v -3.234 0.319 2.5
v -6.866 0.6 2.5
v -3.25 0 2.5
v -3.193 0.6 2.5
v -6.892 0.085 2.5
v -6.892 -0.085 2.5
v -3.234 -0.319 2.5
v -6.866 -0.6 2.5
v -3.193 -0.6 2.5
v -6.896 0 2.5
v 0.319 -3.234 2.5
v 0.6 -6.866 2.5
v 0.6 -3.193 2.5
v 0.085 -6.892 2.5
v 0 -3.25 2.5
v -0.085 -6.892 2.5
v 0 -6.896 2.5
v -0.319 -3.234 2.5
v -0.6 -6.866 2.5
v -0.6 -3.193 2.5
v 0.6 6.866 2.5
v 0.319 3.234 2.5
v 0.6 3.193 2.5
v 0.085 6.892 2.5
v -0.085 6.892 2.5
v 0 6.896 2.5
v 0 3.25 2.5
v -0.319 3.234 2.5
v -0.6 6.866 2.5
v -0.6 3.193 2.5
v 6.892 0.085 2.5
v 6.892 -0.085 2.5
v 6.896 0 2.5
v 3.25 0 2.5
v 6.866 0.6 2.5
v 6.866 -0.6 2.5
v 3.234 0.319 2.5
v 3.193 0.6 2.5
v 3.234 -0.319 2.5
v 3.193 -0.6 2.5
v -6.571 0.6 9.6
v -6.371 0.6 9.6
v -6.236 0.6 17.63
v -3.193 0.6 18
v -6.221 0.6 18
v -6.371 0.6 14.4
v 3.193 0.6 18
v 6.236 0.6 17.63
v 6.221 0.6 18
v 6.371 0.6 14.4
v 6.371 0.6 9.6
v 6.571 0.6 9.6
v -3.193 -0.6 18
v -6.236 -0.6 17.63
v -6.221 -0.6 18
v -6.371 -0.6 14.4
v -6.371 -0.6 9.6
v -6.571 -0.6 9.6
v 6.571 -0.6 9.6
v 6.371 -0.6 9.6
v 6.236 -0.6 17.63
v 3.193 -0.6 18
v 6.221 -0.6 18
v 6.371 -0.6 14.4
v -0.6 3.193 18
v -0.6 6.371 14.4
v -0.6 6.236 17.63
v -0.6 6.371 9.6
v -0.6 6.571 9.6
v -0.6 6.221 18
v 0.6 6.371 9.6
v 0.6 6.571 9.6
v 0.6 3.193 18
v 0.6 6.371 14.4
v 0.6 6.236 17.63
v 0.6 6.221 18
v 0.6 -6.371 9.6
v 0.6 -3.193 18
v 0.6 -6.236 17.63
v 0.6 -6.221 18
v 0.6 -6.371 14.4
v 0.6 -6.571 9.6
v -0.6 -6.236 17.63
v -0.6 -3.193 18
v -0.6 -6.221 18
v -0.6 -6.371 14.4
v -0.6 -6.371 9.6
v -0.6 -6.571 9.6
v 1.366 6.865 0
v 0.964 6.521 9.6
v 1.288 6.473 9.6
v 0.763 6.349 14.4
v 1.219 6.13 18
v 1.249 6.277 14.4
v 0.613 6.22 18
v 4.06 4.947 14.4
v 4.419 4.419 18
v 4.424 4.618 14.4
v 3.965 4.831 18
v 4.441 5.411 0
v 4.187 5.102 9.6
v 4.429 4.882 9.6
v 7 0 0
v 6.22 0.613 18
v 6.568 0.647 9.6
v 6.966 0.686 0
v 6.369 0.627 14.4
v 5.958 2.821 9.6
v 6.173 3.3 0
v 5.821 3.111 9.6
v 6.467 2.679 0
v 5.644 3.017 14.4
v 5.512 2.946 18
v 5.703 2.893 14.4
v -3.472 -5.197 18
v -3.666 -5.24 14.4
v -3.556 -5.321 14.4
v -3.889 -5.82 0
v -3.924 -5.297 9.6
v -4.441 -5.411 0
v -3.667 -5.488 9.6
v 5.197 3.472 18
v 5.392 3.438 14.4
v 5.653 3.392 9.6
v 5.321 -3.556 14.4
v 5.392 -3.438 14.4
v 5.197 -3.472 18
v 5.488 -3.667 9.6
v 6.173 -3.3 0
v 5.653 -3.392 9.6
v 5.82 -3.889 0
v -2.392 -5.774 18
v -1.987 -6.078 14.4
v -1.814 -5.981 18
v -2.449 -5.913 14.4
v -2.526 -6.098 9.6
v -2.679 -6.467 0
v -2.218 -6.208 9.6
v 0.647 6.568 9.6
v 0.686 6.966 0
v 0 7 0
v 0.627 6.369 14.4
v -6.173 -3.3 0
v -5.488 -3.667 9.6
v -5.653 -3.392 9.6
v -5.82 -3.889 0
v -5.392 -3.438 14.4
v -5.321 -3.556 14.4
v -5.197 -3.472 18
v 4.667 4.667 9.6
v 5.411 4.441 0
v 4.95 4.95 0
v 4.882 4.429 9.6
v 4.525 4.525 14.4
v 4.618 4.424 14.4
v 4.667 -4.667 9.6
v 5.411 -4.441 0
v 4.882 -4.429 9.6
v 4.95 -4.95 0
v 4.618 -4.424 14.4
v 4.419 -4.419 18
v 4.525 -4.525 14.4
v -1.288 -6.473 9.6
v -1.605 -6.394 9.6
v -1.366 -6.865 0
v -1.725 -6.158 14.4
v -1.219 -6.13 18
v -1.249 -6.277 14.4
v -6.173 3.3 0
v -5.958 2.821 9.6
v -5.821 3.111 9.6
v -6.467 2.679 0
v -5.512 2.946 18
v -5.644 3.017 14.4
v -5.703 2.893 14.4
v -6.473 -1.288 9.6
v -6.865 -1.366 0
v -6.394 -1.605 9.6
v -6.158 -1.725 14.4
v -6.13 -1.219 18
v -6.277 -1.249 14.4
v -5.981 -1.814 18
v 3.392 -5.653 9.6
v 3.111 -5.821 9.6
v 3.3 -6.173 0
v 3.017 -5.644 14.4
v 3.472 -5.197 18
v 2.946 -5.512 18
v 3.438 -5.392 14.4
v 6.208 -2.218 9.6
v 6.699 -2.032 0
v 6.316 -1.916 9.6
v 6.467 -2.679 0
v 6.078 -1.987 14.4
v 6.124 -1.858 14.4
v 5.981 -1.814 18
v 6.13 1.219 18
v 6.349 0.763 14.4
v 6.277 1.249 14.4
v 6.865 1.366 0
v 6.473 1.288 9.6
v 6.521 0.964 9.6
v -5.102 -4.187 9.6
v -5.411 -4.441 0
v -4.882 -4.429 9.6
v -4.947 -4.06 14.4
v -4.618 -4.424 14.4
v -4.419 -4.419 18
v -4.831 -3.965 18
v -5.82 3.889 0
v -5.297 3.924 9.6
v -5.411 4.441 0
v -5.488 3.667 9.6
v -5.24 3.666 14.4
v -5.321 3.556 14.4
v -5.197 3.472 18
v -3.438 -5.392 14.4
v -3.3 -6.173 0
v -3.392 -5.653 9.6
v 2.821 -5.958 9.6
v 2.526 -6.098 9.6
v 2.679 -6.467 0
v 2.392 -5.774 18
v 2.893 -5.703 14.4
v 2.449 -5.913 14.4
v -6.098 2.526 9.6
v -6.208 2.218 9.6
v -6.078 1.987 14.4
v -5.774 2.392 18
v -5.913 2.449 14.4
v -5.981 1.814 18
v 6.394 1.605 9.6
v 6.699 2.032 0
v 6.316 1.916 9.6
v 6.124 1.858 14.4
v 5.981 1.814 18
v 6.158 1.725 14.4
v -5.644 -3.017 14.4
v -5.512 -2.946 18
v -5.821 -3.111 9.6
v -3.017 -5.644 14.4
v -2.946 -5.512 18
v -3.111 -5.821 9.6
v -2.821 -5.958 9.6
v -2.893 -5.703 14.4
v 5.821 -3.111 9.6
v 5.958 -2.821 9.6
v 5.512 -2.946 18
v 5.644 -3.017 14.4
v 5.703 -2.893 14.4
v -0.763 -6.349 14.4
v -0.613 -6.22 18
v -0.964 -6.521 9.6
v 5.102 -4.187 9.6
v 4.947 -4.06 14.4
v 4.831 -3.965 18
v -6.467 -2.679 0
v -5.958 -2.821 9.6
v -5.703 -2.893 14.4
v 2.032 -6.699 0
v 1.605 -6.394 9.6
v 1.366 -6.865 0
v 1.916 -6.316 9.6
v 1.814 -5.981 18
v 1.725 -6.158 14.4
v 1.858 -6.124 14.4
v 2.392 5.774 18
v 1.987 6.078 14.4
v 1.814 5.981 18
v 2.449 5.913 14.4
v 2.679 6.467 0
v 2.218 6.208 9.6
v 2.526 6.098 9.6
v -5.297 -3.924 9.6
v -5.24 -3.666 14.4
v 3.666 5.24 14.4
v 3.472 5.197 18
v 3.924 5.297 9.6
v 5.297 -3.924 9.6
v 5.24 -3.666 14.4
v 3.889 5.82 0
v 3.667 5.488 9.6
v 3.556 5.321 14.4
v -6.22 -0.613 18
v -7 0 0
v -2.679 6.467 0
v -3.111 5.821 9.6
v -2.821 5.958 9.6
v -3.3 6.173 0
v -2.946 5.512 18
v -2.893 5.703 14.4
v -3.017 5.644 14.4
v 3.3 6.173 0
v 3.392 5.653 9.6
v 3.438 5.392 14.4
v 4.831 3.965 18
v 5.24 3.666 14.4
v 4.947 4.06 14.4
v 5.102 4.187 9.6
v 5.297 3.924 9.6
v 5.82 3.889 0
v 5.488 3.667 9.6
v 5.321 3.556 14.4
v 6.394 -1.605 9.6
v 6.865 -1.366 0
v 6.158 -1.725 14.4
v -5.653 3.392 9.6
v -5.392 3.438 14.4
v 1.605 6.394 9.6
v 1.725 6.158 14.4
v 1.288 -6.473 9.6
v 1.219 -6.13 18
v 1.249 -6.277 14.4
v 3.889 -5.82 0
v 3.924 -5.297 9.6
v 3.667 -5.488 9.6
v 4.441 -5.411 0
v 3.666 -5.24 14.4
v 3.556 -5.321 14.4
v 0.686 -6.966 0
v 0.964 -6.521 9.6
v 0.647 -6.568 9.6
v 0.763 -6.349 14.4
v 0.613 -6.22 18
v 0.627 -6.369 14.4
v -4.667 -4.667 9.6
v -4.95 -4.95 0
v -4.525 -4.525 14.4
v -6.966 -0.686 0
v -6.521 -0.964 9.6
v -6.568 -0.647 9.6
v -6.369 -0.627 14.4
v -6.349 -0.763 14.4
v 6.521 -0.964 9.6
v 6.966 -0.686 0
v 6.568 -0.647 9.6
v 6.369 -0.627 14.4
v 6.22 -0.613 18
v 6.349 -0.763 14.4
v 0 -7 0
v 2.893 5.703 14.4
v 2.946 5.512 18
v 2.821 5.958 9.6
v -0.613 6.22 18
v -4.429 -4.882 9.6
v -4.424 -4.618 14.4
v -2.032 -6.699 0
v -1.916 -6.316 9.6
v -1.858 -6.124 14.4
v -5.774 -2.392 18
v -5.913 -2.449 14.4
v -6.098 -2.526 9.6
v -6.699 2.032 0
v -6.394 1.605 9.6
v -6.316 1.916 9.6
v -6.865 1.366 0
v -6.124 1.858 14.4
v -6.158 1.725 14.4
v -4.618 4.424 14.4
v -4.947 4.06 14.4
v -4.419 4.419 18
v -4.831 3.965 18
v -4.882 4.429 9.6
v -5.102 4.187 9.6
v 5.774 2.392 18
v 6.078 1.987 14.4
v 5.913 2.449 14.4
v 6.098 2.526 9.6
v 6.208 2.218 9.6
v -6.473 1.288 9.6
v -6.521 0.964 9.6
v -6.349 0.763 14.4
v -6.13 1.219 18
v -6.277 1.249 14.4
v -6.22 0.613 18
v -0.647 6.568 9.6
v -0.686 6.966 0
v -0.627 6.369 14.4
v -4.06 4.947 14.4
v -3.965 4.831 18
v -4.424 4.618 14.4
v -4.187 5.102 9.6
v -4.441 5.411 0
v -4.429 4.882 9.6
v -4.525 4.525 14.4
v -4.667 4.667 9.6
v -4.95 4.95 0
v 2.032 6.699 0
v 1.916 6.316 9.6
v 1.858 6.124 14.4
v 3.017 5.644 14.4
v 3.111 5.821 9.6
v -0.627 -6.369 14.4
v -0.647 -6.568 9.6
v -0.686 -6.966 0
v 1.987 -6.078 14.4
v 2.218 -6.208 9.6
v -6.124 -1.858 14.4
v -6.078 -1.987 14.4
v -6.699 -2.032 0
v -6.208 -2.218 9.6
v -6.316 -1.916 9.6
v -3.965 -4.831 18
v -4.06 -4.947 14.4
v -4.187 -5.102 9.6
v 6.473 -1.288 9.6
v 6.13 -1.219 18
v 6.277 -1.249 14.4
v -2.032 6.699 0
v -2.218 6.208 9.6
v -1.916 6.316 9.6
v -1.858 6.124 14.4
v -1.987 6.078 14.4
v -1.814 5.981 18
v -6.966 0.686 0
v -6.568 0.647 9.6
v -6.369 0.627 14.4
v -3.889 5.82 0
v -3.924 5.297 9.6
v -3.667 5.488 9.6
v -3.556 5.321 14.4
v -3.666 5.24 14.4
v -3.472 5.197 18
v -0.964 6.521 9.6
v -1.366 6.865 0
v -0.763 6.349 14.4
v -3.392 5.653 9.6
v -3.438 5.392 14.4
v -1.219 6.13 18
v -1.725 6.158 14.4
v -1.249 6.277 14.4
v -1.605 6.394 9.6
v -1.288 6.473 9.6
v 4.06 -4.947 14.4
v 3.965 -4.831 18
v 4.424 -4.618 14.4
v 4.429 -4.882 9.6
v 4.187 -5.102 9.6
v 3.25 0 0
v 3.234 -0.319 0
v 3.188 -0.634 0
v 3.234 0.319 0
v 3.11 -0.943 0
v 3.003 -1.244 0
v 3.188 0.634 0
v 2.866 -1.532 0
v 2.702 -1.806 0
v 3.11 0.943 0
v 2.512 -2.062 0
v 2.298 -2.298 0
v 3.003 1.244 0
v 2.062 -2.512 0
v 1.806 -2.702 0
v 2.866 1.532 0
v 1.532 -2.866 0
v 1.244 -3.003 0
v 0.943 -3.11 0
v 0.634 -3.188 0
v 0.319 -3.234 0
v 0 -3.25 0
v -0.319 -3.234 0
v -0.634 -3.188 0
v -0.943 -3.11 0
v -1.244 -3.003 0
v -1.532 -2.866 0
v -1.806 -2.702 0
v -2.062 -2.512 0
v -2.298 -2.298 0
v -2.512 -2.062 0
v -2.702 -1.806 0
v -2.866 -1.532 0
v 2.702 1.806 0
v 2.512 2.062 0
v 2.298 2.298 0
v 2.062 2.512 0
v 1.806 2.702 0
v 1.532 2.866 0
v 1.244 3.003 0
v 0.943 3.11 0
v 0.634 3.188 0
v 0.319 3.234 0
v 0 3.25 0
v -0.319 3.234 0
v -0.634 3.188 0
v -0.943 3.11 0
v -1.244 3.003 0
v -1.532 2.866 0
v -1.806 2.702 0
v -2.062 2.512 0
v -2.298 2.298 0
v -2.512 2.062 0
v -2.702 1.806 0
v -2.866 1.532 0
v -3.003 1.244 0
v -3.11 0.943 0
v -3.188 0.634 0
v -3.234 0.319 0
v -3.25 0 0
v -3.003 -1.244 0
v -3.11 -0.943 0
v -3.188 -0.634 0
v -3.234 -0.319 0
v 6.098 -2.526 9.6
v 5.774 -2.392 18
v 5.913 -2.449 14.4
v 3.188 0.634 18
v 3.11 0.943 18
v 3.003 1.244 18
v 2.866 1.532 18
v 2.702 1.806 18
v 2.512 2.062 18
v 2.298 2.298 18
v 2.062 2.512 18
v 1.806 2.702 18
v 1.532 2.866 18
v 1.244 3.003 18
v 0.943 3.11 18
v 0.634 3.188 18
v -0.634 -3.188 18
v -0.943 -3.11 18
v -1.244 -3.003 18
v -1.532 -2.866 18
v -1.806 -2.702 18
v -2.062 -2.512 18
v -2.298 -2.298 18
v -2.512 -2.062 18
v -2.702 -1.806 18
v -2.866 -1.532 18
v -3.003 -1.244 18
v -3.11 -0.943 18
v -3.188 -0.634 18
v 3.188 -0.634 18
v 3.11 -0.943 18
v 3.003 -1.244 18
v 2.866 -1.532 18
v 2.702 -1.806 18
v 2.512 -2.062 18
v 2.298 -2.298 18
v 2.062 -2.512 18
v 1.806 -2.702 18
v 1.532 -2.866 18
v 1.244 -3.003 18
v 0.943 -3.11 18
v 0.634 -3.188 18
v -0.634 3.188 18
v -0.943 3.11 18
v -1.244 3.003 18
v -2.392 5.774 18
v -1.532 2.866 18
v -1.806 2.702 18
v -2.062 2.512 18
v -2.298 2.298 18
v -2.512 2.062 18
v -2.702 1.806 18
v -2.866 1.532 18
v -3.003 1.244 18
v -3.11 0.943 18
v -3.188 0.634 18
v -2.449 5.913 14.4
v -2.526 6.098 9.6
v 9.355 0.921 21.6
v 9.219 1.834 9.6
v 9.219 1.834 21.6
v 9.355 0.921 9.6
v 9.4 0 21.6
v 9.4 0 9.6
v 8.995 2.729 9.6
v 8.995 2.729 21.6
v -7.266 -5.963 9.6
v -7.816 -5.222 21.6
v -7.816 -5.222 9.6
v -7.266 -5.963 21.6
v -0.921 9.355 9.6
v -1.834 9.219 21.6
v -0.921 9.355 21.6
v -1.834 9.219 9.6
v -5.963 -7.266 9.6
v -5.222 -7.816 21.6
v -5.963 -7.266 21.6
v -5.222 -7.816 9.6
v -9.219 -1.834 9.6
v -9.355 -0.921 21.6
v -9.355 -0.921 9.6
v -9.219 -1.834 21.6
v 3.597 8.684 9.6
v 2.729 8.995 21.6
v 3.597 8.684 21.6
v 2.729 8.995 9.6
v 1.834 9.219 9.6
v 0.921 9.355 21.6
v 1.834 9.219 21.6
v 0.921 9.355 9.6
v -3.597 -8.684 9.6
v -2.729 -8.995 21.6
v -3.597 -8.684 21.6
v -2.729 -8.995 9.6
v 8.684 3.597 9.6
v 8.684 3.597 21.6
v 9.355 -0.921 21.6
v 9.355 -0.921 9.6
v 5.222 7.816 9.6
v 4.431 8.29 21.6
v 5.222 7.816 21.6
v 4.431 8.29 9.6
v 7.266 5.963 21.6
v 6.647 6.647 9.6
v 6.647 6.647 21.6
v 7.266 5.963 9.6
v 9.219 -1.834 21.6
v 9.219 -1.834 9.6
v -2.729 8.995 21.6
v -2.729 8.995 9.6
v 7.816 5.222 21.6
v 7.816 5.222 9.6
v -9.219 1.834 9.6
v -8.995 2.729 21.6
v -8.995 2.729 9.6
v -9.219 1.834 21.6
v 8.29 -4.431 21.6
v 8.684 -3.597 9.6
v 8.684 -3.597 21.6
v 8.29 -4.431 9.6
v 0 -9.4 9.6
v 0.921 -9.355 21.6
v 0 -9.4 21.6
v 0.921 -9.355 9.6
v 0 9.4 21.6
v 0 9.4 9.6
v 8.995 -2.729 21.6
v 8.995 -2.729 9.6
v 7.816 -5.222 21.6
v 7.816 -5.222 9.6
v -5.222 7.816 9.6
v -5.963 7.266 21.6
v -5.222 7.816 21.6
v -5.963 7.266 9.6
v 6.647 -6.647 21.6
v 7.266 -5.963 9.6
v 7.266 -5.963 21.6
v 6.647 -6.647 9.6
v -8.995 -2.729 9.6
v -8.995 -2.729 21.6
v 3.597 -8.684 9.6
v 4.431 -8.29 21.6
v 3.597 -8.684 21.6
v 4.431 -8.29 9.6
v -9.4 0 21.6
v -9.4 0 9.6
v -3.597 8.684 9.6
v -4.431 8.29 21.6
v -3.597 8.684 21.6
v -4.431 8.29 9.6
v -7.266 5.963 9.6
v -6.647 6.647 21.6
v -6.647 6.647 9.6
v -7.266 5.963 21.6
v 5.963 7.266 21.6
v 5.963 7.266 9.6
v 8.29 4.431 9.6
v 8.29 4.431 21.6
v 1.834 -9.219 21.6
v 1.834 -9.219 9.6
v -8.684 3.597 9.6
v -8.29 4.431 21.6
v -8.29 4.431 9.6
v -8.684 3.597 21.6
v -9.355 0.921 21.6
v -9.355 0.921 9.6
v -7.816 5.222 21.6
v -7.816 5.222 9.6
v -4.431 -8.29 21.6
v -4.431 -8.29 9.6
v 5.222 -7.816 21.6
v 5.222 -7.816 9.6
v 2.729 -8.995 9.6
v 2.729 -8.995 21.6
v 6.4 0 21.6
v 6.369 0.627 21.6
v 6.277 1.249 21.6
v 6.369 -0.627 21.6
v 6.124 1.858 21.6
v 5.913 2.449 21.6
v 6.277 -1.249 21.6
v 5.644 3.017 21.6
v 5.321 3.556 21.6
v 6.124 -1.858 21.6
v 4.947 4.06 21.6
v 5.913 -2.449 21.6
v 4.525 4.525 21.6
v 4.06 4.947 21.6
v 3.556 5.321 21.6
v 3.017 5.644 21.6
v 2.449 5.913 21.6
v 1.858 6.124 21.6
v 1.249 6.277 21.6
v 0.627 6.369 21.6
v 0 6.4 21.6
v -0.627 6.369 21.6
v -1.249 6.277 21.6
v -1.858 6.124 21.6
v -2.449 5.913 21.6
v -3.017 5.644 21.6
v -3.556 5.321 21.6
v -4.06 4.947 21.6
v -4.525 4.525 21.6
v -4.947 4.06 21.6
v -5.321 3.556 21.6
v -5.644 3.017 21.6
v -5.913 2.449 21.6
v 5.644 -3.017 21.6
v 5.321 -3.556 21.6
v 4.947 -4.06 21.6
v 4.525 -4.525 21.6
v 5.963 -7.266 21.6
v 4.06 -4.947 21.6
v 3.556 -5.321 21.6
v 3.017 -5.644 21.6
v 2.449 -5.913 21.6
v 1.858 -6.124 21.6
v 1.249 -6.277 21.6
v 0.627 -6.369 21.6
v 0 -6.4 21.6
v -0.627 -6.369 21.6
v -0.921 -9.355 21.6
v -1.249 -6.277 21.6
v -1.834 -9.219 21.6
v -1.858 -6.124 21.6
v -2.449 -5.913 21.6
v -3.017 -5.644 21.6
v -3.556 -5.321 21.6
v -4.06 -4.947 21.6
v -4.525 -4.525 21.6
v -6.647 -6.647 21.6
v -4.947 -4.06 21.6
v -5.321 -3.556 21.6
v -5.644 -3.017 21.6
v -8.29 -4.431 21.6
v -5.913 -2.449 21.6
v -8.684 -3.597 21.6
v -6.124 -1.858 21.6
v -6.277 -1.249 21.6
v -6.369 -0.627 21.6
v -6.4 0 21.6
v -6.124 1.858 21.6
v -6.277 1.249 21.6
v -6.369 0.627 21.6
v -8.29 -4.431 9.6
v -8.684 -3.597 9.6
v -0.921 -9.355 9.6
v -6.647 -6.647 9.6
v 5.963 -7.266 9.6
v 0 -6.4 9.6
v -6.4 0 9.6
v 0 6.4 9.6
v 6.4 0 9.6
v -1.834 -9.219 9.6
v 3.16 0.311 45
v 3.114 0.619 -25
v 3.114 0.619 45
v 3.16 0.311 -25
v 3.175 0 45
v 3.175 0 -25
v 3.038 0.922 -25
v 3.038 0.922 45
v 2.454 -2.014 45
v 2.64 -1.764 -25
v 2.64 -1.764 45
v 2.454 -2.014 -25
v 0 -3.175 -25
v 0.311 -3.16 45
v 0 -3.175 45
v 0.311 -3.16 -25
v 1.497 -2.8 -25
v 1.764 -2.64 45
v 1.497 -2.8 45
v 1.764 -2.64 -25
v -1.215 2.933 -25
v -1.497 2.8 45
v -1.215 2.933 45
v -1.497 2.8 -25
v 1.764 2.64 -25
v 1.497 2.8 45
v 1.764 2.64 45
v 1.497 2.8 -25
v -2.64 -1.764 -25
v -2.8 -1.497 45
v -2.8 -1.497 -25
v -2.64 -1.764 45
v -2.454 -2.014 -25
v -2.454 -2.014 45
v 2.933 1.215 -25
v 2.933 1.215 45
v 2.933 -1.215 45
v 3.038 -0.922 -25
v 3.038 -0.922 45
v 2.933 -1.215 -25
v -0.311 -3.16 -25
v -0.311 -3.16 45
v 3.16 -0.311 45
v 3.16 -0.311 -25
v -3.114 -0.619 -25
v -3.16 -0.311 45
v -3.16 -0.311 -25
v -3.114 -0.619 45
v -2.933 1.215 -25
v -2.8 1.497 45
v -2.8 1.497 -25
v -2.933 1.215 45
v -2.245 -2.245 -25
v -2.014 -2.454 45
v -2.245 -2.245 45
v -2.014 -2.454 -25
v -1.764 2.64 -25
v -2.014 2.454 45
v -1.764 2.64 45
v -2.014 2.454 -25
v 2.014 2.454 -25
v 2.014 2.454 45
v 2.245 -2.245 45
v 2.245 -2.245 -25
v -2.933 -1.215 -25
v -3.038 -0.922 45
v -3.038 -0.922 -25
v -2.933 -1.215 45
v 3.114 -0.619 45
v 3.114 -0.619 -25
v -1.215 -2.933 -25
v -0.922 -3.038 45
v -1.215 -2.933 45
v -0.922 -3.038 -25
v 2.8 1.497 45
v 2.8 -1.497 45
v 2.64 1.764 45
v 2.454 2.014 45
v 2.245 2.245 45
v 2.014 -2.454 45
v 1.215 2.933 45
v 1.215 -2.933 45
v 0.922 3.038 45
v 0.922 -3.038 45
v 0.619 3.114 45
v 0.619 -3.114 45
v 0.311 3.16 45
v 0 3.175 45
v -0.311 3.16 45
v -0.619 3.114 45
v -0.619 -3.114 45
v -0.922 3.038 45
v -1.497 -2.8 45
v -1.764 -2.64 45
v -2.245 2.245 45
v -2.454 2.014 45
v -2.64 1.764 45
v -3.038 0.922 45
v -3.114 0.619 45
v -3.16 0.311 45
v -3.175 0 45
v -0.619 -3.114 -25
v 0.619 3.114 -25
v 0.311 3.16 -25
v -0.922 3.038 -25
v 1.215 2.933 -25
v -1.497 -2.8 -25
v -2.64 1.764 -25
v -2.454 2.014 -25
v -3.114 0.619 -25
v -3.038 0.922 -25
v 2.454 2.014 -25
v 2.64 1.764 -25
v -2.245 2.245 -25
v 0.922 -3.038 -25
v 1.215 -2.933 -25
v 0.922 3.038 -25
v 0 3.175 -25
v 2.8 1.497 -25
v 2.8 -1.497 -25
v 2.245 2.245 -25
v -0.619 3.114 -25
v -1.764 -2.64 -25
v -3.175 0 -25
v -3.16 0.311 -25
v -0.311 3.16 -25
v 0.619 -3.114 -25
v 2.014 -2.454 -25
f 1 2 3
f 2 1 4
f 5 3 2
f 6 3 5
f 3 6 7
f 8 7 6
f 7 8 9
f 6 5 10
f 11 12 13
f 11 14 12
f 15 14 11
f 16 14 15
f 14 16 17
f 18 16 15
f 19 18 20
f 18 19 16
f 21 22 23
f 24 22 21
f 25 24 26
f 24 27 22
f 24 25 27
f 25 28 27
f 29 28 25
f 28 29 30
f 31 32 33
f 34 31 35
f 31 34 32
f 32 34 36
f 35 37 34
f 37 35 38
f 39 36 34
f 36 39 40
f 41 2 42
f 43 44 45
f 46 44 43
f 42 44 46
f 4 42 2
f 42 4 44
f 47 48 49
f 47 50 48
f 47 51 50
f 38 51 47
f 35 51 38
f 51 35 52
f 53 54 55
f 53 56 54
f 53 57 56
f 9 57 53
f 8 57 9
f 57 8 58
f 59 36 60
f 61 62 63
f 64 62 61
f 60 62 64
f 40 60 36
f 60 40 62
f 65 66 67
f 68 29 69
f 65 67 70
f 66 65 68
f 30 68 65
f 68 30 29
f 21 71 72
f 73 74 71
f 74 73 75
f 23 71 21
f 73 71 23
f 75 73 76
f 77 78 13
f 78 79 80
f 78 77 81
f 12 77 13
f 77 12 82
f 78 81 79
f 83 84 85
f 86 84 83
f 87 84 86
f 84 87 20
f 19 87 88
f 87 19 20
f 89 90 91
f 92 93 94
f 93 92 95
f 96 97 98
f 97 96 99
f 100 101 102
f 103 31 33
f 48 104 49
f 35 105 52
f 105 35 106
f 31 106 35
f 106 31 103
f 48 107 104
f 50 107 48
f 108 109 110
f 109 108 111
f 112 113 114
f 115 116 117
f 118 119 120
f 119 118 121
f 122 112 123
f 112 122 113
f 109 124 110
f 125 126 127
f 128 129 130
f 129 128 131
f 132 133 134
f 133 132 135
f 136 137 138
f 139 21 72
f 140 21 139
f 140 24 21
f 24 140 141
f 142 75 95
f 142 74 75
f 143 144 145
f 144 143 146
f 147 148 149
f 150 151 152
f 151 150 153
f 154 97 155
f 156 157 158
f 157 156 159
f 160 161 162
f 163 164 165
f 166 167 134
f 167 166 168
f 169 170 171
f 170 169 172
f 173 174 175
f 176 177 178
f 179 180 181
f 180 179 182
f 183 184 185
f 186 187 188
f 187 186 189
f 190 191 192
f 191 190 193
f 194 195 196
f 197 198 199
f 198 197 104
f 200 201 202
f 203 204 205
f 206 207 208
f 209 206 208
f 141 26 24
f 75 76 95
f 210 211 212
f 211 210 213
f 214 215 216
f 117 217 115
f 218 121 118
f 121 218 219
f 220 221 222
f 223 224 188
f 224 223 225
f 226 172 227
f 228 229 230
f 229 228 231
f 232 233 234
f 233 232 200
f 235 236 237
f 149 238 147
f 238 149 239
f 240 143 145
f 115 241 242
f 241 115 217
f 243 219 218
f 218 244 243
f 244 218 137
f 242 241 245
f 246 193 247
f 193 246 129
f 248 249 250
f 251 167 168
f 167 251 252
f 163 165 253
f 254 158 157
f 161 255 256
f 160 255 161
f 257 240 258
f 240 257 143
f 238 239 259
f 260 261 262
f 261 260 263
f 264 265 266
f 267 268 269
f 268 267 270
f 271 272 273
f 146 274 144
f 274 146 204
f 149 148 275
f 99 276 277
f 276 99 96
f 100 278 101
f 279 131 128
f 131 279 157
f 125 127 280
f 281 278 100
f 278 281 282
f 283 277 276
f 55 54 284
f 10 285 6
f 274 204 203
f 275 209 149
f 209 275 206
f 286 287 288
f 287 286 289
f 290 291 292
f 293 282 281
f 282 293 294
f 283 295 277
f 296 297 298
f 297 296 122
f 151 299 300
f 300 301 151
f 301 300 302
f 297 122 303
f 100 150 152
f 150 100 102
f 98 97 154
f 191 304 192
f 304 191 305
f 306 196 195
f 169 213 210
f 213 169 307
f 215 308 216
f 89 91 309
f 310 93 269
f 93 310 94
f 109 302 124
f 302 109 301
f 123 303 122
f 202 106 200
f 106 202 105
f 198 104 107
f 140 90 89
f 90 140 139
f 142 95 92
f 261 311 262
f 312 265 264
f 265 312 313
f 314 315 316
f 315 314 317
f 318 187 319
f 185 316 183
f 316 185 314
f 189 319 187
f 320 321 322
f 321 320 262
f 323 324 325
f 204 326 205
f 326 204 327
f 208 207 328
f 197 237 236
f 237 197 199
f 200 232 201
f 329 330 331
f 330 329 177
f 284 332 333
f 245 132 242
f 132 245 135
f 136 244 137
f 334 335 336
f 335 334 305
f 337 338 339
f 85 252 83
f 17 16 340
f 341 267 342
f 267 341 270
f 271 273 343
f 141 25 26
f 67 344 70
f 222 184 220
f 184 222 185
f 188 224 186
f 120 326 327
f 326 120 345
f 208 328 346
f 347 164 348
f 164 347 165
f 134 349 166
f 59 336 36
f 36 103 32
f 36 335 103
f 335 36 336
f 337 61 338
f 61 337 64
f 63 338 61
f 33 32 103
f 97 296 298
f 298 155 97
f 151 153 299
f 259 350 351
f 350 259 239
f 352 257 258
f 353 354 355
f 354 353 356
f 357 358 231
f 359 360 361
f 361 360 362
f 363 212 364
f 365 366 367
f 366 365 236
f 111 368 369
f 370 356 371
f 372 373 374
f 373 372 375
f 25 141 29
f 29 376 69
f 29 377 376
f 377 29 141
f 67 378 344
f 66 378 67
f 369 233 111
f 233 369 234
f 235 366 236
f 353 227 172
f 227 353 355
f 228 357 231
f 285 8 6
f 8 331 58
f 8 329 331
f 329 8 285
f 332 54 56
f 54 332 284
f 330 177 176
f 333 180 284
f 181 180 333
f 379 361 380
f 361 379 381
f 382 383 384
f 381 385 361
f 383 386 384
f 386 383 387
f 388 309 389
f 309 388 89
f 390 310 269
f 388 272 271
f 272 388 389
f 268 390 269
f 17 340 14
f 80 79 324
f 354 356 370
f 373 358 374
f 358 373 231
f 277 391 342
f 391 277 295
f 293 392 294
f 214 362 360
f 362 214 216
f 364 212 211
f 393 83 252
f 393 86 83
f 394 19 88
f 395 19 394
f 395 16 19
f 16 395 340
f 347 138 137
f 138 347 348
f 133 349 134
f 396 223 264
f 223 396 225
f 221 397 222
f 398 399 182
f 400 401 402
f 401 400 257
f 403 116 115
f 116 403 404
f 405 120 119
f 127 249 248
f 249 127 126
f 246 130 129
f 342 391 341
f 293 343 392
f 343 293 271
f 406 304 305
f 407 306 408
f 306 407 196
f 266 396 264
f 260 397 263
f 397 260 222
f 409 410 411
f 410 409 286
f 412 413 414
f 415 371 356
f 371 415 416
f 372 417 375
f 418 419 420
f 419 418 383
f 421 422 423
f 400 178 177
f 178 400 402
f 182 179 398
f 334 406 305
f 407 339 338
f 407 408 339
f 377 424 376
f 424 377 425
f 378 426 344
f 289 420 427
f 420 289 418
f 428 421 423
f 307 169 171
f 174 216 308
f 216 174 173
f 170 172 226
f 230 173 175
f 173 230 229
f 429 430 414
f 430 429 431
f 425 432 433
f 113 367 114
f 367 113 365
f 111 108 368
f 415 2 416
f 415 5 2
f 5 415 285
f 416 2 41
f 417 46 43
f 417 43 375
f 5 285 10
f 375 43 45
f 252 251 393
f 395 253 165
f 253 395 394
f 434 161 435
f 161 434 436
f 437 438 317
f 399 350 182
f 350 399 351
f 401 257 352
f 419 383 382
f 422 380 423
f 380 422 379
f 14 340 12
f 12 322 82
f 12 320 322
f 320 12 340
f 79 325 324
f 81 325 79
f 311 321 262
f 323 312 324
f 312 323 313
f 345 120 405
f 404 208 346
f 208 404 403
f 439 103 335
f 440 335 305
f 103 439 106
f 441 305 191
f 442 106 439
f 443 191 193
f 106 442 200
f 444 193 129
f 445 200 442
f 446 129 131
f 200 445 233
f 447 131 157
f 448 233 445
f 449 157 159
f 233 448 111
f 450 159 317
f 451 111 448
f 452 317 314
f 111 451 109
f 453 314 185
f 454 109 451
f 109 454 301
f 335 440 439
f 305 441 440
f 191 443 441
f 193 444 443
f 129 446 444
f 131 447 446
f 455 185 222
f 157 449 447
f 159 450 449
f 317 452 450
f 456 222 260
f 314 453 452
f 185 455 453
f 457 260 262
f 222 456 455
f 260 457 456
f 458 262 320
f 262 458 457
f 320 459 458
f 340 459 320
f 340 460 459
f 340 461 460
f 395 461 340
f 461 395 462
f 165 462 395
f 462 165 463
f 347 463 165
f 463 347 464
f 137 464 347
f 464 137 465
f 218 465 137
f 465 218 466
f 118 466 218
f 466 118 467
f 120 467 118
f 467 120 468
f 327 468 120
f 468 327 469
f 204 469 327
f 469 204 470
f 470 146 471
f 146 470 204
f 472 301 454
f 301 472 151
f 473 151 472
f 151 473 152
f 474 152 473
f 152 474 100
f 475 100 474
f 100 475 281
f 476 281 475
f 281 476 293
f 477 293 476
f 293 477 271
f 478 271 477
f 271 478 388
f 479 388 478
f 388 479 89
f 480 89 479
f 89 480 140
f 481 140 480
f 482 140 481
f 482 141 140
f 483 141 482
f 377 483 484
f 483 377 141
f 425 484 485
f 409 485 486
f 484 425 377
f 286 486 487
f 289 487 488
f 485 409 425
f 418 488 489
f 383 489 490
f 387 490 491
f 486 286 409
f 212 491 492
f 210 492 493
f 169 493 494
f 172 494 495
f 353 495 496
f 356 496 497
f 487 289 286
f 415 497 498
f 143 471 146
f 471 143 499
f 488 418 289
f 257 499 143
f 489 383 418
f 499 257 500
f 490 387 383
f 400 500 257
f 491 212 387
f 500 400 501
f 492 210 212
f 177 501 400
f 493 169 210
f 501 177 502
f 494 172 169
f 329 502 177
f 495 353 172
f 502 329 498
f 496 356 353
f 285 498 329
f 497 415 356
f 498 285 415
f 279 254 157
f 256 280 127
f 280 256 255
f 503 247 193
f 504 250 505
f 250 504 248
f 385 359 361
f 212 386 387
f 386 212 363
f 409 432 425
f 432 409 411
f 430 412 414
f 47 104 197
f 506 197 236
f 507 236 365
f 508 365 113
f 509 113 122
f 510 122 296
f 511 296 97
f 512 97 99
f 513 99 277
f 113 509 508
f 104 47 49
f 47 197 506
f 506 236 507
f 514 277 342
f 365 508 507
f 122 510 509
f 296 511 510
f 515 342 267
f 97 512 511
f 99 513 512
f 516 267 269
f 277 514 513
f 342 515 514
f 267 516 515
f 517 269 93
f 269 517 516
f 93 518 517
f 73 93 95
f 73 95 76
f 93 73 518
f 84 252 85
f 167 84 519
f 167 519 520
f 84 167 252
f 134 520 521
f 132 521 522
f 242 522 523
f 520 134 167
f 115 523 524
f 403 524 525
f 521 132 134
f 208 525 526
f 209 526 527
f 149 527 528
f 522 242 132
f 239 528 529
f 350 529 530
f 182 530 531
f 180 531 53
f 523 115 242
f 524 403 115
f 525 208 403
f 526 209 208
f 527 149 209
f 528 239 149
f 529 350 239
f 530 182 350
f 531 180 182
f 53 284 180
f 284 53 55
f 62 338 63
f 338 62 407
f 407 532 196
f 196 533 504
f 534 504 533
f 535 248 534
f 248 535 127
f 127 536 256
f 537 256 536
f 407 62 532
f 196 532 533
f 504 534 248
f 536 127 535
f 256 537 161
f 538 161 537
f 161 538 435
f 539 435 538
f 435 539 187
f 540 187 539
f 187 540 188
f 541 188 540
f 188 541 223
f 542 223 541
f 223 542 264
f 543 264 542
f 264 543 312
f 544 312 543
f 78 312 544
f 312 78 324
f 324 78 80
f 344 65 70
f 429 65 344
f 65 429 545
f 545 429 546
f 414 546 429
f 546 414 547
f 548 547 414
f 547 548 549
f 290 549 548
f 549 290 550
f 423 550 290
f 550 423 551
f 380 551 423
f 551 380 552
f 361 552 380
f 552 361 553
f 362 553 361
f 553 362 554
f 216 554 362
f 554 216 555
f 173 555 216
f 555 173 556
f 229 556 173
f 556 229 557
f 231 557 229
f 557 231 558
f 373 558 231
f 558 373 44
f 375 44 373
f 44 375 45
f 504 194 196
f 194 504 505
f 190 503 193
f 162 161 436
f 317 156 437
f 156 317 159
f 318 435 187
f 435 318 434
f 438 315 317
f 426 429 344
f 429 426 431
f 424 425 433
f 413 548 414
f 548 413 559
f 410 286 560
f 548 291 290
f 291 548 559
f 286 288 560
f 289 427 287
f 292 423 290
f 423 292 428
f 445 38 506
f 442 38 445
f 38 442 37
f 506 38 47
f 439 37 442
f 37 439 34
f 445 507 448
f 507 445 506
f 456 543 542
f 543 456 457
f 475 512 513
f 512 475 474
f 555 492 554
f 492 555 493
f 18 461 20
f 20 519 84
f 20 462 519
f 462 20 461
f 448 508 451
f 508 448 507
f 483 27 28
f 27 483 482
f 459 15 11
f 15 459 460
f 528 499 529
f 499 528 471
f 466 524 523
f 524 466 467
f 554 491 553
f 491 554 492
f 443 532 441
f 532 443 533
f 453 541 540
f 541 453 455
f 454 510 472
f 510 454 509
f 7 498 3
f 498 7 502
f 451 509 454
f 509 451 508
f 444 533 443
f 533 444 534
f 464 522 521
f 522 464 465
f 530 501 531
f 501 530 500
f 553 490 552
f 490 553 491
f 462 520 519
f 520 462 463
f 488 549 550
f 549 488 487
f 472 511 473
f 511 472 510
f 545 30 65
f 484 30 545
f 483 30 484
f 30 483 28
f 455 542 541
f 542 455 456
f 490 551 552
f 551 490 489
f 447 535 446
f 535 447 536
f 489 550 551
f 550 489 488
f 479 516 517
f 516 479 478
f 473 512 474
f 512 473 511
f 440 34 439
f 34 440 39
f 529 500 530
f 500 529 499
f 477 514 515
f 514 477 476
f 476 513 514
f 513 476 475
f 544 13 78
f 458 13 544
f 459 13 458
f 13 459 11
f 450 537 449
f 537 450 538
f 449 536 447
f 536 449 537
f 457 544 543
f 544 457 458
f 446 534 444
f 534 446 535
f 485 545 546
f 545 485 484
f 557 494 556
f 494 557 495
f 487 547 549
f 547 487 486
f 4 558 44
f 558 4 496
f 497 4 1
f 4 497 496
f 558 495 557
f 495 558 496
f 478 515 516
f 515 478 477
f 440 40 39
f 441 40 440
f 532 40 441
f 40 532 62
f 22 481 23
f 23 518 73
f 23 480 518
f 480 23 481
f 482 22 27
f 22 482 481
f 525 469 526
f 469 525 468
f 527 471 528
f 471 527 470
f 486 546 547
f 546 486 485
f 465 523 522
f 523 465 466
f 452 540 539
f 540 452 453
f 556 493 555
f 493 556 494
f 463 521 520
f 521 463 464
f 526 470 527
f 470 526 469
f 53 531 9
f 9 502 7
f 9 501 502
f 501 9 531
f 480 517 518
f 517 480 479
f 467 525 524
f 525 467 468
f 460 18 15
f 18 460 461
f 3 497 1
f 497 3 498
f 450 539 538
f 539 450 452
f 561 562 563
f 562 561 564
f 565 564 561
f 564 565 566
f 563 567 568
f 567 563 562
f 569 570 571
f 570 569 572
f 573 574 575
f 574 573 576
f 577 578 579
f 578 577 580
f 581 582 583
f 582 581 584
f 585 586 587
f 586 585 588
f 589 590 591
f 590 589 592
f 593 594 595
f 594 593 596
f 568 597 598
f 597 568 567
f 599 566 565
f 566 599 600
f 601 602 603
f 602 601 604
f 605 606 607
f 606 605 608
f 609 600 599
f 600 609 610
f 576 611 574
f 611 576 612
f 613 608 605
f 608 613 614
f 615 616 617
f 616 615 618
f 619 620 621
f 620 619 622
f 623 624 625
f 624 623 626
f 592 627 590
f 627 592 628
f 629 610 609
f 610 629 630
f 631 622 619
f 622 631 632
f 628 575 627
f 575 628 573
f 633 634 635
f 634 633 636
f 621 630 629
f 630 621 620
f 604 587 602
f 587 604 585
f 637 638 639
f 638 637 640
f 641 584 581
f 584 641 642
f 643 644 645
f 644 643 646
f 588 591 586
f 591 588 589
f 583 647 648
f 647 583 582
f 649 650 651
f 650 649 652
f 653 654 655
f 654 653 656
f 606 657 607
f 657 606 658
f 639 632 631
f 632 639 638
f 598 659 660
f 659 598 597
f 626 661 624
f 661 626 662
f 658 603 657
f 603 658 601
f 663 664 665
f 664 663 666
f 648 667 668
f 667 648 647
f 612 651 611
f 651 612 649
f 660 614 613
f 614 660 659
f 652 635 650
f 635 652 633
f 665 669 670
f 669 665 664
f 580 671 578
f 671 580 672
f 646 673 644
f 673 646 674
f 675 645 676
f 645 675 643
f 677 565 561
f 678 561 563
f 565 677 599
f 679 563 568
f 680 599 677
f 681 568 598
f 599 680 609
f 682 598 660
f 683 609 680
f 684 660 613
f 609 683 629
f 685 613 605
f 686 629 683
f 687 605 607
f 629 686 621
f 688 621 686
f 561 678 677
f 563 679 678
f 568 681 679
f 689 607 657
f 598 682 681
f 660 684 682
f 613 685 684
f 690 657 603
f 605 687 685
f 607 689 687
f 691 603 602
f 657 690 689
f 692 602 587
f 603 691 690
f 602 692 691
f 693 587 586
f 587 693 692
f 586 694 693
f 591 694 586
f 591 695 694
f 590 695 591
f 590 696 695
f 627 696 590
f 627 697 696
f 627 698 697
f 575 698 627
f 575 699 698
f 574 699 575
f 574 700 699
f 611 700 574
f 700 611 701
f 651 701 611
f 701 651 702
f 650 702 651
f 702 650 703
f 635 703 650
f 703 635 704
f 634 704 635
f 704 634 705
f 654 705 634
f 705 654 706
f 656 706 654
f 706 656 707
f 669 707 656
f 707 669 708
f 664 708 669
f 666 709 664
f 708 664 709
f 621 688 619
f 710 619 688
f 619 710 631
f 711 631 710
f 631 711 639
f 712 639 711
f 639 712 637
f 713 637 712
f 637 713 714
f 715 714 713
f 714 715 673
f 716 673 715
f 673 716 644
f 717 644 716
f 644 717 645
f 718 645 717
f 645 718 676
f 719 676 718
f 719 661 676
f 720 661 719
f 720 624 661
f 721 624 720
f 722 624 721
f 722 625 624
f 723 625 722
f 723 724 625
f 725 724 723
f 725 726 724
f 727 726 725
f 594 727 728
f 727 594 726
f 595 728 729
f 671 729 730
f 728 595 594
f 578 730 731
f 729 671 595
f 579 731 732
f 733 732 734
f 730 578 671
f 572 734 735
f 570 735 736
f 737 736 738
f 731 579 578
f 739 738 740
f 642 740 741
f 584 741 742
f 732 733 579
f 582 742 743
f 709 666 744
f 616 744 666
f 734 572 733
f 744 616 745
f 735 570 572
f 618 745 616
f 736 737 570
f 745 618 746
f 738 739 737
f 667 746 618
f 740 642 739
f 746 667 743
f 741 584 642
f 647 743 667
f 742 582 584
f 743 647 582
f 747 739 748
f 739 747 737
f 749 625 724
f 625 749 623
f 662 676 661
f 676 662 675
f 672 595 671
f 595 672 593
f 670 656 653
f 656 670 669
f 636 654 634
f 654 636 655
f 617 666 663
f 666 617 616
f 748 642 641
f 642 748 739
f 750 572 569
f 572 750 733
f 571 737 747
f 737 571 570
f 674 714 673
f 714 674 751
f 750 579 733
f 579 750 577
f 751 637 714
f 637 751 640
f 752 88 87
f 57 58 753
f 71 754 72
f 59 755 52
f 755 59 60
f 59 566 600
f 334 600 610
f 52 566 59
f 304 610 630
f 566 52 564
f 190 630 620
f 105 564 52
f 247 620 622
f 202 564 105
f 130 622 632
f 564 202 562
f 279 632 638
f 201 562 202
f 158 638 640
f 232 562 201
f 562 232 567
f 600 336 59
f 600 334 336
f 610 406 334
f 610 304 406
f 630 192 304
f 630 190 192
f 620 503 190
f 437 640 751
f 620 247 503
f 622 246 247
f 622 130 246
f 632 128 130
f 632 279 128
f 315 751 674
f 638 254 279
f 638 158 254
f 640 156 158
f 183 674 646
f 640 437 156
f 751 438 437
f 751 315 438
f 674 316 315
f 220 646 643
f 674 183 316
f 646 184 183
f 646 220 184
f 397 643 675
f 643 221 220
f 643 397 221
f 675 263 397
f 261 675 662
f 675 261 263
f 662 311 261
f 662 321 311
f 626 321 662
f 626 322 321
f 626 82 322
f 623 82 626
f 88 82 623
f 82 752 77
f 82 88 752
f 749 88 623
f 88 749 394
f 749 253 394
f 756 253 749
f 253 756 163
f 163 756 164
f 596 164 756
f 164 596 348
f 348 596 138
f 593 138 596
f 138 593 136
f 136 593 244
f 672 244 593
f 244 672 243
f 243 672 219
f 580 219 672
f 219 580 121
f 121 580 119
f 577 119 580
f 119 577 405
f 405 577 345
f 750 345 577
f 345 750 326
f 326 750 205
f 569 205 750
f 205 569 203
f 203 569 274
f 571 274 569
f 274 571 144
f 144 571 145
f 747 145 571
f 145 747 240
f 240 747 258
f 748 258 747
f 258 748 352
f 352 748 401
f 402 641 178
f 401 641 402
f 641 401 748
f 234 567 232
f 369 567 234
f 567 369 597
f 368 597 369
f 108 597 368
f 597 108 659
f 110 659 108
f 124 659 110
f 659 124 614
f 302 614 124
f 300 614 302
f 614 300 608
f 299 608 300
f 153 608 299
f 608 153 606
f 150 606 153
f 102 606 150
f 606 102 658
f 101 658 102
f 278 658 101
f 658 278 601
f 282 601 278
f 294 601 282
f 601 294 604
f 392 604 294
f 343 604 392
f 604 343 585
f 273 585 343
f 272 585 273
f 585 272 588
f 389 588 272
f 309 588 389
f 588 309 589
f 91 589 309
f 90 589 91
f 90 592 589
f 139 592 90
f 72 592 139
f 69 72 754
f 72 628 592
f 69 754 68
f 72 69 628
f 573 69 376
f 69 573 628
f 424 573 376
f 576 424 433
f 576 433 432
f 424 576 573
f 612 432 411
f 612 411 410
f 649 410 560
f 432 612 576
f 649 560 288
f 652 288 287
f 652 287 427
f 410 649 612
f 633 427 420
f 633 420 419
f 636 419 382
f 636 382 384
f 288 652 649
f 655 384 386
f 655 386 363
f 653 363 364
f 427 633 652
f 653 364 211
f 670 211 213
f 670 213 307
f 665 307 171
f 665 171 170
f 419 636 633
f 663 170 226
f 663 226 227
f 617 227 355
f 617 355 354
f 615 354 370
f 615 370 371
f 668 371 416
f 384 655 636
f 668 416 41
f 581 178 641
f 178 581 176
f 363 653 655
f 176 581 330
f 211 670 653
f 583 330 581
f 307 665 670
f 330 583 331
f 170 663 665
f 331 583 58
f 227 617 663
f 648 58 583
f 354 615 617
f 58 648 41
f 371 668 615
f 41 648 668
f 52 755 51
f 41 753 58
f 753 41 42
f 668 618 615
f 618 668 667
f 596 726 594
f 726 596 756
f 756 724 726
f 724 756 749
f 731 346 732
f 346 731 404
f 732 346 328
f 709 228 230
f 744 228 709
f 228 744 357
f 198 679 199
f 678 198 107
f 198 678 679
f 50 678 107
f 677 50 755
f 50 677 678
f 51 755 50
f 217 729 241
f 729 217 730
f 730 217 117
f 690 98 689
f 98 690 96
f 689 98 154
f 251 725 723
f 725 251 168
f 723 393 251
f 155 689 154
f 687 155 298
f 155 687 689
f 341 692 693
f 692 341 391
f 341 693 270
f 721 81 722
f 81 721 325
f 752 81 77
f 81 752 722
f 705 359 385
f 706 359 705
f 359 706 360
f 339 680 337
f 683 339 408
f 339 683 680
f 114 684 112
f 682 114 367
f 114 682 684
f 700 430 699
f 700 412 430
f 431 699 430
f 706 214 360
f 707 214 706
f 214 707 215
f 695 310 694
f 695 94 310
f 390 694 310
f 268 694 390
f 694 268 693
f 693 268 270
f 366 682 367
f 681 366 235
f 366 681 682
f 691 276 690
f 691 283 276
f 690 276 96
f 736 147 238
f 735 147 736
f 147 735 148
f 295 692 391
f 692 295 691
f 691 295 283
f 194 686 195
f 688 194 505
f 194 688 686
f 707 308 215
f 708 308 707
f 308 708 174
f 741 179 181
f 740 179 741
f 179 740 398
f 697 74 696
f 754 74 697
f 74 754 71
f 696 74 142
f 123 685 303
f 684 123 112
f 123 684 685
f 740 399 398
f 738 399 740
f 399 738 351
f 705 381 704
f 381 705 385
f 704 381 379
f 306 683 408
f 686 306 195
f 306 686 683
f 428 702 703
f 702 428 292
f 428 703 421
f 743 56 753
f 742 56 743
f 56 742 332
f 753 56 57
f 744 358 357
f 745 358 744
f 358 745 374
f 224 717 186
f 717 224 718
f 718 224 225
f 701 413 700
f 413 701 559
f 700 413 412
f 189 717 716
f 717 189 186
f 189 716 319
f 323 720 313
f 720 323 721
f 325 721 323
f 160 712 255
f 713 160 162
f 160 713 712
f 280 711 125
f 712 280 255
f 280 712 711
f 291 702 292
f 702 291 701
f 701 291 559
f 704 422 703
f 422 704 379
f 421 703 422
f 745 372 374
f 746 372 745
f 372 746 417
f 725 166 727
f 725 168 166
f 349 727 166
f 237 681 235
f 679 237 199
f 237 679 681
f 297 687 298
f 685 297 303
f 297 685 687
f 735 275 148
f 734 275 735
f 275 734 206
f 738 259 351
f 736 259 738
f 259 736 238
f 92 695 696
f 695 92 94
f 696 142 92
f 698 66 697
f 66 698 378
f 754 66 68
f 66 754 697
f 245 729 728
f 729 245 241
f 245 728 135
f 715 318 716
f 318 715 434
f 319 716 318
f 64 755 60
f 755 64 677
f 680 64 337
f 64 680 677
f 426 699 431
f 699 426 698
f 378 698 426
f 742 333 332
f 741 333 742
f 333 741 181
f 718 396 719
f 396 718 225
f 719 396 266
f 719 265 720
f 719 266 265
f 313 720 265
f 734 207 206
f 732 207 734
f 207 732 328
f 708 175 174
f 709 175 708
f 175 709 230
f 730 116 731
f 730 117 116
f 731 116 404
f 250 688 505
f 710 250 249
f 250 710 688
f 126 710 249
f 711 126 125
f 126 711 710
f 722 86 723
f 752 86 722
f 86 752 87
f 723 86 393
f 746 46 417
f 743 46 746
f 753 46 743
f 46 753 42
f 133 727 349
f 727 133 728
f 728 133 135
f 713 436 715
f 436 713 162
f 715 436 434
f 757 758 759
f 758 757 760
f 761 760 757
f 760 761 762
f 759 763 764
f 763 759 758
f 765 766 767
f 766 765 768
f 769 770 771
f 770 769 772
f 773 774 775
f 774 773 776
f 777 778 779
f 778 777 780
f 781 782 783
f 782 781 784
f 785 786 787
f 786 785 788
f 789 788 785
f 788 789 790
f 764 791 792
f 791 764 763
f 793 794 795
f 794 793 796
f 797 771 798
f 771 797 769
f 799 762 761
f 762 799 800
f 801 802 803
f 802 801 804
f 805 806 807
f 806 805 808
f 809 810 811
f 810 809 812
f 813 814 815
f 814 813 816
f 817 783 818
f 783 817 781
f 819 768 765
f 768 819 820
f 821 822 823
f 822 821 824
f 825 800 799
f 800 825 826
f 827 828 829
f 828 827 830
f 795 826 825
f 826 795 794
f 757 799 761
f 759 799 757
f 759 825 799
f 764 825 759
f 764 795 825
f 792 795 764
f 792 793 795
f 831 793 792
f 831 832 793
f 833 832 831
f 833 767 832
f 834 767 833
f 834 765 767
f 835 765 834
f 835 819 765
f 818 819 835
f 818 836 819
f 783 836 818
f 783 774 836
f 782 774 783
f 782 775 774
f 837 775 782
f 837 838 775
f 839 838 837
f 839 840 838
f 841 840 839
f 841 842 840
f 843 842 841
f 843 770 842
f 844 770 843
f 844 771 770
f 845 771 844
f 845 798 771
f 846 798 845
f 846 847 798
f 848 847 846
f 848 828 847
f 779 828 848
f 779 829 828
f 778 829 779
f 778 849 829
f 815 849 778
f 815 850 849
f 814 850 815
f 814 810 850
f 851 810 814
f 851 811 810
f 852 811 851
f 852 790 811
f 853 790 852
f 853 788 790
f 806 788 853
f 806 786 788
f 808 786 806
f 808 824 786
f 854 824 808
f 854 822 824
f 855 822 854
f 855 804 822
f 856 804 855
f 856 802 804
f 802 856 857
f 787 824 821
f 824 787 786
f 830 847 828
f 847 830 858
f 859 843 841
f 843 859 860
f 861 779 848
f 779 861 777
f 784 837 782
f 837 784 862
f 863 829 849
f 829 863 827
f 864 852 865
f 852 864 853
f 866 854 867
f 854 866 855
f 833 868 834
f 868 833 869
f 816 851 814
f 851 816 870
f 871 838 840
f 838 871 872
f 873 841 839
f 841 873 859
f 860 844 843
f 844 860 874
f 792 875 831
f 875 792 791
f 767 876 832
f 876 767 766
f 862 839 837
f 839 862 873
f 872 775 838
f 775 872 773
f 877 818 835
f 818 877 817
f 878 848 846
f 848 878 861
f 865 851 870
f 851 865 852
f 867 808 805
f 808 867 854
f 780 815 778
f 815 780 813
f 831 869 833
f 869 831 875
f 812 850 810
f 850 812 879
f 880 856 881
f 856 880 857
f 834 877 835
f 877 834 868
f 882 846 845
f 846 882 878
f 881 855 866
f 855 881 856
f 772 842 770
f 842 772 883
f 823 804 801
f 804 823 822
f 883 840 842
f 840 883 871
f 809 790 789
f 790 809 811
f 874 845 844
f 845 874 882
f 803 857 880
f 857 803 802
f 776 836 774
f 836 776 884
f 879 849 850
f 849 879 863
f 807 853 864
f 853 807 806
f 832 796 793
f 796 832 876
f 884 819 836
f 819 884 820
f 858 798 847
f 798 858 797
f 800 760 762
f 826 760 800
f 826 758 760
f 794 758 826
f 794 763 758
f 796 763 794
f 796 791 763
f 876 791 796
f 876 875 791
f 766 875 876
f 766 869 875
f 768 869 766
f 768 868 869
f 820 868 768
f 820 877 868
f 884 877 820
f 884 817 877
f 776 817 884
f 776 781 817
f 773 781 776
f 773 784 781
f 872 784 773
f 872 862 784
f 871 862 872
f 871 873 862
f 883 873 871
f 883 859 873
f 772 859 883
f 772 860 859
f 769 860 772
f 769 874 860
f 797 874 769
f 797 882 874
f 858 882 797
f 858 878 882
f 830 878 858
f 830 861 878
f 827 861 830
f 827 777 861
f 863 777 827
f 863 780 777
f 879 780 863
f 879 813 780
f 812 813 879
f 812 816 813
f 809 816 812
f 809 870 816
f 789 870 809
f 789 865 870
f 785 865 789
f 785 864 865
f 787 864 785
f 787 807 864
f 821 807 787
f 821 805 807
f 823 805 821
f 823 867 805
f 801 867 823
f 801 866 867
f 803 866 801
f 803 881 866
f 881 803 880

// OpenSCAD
// Siphon strainer -- 1/4" tubing adapter (split collet + collar)
// Printed as a standalone pair; the sphere filter is combined later.
//
// Two fixes over the original geometry:
//   1. base_ring: slot cuts stop 2.5 mm short of the base, so the collet is one
//      part instead of four loose quarter-shells.
//   2. collar_id = clamp_od + collar_gap. The original clamp_od - 0.5 was
//      smaller than the collet's small end and could not be fitted at all.
//
// GRIP is set by the two numbers below. tube_bore controls how much the
// fingers must close to reach the tubing; collar_gap controls how hard the
// collar wedges them. Printed bores come out undersize by ~0.1-0.2 mm, so
// this is guess-and-check.

$fn = 64;

// ---- grip class (these are the knobs) ----
tube_bore  = 6.50;   // nominal tubing OD is 6.35
collar_gap = 0.30;   // collar_id = clamp_od + this

// Tubing
tube_od = 6.35;

// Collet
clamp_length = 18;
wall = 3;
slot_width = 1.2;
num_slots = 4;
taper = 1.5;
base_ring = 2.5;

// Collar
collar_length = 12;

// Derived
clamp_od  = tube_bore + 2*wall;
collar_id = clamp_od + collar_gap;
collar_od = collar_id + 2*wall;

// squeeze available at the base-ring stop, and the gap the fingers must close
gap_to_tube = (tube_bore - tube_od)/2;
squeeze_max = (taper*(1-base_ring/clamp_length) - collar_gap)/2;

echo(str("GRIP: bore=", tube_bore, " gap_to_tube=", gap_to_tube,
         " | collar_id=", collar_id, " squeeze_max=", squeeze_max));

module collet() {
    difference() {
        cylinder(h=clamp_length, d1=clamp_od+taper, d2=clamp_od);

        translate([0,0,-0.1])
            cylinder(h=clamp_length+0.2, d=tube_bore);

        for (a=[0:360/num_slots:359]) {
            rotate([0,0,a])
                translate([0,-slot_width/2,base_ring])
                    cube([clamp_od+taper, slot_width, clamp_length-base_ring+0.1]);
        }
    }
}

module collar() {
    difference() {
        cylinder(h=collar_length, d=collar_od);
        translate([0,0,-0.1])
            cylinder(h=collar_length+0.2, d=collar_id);
    }
}

// --- assembly preview: collar seated to grip, tubing through the bore ---
z_grip = 9.6;   // ~0.2 mm radial squeeze on the tubing

color("SteelBlue") collet();
color("DarkOrange") translate([0,0,z_grip]) collar();
color("Silver") translate([0,0,-25]) cylinder(h=70, d=tube_od);
